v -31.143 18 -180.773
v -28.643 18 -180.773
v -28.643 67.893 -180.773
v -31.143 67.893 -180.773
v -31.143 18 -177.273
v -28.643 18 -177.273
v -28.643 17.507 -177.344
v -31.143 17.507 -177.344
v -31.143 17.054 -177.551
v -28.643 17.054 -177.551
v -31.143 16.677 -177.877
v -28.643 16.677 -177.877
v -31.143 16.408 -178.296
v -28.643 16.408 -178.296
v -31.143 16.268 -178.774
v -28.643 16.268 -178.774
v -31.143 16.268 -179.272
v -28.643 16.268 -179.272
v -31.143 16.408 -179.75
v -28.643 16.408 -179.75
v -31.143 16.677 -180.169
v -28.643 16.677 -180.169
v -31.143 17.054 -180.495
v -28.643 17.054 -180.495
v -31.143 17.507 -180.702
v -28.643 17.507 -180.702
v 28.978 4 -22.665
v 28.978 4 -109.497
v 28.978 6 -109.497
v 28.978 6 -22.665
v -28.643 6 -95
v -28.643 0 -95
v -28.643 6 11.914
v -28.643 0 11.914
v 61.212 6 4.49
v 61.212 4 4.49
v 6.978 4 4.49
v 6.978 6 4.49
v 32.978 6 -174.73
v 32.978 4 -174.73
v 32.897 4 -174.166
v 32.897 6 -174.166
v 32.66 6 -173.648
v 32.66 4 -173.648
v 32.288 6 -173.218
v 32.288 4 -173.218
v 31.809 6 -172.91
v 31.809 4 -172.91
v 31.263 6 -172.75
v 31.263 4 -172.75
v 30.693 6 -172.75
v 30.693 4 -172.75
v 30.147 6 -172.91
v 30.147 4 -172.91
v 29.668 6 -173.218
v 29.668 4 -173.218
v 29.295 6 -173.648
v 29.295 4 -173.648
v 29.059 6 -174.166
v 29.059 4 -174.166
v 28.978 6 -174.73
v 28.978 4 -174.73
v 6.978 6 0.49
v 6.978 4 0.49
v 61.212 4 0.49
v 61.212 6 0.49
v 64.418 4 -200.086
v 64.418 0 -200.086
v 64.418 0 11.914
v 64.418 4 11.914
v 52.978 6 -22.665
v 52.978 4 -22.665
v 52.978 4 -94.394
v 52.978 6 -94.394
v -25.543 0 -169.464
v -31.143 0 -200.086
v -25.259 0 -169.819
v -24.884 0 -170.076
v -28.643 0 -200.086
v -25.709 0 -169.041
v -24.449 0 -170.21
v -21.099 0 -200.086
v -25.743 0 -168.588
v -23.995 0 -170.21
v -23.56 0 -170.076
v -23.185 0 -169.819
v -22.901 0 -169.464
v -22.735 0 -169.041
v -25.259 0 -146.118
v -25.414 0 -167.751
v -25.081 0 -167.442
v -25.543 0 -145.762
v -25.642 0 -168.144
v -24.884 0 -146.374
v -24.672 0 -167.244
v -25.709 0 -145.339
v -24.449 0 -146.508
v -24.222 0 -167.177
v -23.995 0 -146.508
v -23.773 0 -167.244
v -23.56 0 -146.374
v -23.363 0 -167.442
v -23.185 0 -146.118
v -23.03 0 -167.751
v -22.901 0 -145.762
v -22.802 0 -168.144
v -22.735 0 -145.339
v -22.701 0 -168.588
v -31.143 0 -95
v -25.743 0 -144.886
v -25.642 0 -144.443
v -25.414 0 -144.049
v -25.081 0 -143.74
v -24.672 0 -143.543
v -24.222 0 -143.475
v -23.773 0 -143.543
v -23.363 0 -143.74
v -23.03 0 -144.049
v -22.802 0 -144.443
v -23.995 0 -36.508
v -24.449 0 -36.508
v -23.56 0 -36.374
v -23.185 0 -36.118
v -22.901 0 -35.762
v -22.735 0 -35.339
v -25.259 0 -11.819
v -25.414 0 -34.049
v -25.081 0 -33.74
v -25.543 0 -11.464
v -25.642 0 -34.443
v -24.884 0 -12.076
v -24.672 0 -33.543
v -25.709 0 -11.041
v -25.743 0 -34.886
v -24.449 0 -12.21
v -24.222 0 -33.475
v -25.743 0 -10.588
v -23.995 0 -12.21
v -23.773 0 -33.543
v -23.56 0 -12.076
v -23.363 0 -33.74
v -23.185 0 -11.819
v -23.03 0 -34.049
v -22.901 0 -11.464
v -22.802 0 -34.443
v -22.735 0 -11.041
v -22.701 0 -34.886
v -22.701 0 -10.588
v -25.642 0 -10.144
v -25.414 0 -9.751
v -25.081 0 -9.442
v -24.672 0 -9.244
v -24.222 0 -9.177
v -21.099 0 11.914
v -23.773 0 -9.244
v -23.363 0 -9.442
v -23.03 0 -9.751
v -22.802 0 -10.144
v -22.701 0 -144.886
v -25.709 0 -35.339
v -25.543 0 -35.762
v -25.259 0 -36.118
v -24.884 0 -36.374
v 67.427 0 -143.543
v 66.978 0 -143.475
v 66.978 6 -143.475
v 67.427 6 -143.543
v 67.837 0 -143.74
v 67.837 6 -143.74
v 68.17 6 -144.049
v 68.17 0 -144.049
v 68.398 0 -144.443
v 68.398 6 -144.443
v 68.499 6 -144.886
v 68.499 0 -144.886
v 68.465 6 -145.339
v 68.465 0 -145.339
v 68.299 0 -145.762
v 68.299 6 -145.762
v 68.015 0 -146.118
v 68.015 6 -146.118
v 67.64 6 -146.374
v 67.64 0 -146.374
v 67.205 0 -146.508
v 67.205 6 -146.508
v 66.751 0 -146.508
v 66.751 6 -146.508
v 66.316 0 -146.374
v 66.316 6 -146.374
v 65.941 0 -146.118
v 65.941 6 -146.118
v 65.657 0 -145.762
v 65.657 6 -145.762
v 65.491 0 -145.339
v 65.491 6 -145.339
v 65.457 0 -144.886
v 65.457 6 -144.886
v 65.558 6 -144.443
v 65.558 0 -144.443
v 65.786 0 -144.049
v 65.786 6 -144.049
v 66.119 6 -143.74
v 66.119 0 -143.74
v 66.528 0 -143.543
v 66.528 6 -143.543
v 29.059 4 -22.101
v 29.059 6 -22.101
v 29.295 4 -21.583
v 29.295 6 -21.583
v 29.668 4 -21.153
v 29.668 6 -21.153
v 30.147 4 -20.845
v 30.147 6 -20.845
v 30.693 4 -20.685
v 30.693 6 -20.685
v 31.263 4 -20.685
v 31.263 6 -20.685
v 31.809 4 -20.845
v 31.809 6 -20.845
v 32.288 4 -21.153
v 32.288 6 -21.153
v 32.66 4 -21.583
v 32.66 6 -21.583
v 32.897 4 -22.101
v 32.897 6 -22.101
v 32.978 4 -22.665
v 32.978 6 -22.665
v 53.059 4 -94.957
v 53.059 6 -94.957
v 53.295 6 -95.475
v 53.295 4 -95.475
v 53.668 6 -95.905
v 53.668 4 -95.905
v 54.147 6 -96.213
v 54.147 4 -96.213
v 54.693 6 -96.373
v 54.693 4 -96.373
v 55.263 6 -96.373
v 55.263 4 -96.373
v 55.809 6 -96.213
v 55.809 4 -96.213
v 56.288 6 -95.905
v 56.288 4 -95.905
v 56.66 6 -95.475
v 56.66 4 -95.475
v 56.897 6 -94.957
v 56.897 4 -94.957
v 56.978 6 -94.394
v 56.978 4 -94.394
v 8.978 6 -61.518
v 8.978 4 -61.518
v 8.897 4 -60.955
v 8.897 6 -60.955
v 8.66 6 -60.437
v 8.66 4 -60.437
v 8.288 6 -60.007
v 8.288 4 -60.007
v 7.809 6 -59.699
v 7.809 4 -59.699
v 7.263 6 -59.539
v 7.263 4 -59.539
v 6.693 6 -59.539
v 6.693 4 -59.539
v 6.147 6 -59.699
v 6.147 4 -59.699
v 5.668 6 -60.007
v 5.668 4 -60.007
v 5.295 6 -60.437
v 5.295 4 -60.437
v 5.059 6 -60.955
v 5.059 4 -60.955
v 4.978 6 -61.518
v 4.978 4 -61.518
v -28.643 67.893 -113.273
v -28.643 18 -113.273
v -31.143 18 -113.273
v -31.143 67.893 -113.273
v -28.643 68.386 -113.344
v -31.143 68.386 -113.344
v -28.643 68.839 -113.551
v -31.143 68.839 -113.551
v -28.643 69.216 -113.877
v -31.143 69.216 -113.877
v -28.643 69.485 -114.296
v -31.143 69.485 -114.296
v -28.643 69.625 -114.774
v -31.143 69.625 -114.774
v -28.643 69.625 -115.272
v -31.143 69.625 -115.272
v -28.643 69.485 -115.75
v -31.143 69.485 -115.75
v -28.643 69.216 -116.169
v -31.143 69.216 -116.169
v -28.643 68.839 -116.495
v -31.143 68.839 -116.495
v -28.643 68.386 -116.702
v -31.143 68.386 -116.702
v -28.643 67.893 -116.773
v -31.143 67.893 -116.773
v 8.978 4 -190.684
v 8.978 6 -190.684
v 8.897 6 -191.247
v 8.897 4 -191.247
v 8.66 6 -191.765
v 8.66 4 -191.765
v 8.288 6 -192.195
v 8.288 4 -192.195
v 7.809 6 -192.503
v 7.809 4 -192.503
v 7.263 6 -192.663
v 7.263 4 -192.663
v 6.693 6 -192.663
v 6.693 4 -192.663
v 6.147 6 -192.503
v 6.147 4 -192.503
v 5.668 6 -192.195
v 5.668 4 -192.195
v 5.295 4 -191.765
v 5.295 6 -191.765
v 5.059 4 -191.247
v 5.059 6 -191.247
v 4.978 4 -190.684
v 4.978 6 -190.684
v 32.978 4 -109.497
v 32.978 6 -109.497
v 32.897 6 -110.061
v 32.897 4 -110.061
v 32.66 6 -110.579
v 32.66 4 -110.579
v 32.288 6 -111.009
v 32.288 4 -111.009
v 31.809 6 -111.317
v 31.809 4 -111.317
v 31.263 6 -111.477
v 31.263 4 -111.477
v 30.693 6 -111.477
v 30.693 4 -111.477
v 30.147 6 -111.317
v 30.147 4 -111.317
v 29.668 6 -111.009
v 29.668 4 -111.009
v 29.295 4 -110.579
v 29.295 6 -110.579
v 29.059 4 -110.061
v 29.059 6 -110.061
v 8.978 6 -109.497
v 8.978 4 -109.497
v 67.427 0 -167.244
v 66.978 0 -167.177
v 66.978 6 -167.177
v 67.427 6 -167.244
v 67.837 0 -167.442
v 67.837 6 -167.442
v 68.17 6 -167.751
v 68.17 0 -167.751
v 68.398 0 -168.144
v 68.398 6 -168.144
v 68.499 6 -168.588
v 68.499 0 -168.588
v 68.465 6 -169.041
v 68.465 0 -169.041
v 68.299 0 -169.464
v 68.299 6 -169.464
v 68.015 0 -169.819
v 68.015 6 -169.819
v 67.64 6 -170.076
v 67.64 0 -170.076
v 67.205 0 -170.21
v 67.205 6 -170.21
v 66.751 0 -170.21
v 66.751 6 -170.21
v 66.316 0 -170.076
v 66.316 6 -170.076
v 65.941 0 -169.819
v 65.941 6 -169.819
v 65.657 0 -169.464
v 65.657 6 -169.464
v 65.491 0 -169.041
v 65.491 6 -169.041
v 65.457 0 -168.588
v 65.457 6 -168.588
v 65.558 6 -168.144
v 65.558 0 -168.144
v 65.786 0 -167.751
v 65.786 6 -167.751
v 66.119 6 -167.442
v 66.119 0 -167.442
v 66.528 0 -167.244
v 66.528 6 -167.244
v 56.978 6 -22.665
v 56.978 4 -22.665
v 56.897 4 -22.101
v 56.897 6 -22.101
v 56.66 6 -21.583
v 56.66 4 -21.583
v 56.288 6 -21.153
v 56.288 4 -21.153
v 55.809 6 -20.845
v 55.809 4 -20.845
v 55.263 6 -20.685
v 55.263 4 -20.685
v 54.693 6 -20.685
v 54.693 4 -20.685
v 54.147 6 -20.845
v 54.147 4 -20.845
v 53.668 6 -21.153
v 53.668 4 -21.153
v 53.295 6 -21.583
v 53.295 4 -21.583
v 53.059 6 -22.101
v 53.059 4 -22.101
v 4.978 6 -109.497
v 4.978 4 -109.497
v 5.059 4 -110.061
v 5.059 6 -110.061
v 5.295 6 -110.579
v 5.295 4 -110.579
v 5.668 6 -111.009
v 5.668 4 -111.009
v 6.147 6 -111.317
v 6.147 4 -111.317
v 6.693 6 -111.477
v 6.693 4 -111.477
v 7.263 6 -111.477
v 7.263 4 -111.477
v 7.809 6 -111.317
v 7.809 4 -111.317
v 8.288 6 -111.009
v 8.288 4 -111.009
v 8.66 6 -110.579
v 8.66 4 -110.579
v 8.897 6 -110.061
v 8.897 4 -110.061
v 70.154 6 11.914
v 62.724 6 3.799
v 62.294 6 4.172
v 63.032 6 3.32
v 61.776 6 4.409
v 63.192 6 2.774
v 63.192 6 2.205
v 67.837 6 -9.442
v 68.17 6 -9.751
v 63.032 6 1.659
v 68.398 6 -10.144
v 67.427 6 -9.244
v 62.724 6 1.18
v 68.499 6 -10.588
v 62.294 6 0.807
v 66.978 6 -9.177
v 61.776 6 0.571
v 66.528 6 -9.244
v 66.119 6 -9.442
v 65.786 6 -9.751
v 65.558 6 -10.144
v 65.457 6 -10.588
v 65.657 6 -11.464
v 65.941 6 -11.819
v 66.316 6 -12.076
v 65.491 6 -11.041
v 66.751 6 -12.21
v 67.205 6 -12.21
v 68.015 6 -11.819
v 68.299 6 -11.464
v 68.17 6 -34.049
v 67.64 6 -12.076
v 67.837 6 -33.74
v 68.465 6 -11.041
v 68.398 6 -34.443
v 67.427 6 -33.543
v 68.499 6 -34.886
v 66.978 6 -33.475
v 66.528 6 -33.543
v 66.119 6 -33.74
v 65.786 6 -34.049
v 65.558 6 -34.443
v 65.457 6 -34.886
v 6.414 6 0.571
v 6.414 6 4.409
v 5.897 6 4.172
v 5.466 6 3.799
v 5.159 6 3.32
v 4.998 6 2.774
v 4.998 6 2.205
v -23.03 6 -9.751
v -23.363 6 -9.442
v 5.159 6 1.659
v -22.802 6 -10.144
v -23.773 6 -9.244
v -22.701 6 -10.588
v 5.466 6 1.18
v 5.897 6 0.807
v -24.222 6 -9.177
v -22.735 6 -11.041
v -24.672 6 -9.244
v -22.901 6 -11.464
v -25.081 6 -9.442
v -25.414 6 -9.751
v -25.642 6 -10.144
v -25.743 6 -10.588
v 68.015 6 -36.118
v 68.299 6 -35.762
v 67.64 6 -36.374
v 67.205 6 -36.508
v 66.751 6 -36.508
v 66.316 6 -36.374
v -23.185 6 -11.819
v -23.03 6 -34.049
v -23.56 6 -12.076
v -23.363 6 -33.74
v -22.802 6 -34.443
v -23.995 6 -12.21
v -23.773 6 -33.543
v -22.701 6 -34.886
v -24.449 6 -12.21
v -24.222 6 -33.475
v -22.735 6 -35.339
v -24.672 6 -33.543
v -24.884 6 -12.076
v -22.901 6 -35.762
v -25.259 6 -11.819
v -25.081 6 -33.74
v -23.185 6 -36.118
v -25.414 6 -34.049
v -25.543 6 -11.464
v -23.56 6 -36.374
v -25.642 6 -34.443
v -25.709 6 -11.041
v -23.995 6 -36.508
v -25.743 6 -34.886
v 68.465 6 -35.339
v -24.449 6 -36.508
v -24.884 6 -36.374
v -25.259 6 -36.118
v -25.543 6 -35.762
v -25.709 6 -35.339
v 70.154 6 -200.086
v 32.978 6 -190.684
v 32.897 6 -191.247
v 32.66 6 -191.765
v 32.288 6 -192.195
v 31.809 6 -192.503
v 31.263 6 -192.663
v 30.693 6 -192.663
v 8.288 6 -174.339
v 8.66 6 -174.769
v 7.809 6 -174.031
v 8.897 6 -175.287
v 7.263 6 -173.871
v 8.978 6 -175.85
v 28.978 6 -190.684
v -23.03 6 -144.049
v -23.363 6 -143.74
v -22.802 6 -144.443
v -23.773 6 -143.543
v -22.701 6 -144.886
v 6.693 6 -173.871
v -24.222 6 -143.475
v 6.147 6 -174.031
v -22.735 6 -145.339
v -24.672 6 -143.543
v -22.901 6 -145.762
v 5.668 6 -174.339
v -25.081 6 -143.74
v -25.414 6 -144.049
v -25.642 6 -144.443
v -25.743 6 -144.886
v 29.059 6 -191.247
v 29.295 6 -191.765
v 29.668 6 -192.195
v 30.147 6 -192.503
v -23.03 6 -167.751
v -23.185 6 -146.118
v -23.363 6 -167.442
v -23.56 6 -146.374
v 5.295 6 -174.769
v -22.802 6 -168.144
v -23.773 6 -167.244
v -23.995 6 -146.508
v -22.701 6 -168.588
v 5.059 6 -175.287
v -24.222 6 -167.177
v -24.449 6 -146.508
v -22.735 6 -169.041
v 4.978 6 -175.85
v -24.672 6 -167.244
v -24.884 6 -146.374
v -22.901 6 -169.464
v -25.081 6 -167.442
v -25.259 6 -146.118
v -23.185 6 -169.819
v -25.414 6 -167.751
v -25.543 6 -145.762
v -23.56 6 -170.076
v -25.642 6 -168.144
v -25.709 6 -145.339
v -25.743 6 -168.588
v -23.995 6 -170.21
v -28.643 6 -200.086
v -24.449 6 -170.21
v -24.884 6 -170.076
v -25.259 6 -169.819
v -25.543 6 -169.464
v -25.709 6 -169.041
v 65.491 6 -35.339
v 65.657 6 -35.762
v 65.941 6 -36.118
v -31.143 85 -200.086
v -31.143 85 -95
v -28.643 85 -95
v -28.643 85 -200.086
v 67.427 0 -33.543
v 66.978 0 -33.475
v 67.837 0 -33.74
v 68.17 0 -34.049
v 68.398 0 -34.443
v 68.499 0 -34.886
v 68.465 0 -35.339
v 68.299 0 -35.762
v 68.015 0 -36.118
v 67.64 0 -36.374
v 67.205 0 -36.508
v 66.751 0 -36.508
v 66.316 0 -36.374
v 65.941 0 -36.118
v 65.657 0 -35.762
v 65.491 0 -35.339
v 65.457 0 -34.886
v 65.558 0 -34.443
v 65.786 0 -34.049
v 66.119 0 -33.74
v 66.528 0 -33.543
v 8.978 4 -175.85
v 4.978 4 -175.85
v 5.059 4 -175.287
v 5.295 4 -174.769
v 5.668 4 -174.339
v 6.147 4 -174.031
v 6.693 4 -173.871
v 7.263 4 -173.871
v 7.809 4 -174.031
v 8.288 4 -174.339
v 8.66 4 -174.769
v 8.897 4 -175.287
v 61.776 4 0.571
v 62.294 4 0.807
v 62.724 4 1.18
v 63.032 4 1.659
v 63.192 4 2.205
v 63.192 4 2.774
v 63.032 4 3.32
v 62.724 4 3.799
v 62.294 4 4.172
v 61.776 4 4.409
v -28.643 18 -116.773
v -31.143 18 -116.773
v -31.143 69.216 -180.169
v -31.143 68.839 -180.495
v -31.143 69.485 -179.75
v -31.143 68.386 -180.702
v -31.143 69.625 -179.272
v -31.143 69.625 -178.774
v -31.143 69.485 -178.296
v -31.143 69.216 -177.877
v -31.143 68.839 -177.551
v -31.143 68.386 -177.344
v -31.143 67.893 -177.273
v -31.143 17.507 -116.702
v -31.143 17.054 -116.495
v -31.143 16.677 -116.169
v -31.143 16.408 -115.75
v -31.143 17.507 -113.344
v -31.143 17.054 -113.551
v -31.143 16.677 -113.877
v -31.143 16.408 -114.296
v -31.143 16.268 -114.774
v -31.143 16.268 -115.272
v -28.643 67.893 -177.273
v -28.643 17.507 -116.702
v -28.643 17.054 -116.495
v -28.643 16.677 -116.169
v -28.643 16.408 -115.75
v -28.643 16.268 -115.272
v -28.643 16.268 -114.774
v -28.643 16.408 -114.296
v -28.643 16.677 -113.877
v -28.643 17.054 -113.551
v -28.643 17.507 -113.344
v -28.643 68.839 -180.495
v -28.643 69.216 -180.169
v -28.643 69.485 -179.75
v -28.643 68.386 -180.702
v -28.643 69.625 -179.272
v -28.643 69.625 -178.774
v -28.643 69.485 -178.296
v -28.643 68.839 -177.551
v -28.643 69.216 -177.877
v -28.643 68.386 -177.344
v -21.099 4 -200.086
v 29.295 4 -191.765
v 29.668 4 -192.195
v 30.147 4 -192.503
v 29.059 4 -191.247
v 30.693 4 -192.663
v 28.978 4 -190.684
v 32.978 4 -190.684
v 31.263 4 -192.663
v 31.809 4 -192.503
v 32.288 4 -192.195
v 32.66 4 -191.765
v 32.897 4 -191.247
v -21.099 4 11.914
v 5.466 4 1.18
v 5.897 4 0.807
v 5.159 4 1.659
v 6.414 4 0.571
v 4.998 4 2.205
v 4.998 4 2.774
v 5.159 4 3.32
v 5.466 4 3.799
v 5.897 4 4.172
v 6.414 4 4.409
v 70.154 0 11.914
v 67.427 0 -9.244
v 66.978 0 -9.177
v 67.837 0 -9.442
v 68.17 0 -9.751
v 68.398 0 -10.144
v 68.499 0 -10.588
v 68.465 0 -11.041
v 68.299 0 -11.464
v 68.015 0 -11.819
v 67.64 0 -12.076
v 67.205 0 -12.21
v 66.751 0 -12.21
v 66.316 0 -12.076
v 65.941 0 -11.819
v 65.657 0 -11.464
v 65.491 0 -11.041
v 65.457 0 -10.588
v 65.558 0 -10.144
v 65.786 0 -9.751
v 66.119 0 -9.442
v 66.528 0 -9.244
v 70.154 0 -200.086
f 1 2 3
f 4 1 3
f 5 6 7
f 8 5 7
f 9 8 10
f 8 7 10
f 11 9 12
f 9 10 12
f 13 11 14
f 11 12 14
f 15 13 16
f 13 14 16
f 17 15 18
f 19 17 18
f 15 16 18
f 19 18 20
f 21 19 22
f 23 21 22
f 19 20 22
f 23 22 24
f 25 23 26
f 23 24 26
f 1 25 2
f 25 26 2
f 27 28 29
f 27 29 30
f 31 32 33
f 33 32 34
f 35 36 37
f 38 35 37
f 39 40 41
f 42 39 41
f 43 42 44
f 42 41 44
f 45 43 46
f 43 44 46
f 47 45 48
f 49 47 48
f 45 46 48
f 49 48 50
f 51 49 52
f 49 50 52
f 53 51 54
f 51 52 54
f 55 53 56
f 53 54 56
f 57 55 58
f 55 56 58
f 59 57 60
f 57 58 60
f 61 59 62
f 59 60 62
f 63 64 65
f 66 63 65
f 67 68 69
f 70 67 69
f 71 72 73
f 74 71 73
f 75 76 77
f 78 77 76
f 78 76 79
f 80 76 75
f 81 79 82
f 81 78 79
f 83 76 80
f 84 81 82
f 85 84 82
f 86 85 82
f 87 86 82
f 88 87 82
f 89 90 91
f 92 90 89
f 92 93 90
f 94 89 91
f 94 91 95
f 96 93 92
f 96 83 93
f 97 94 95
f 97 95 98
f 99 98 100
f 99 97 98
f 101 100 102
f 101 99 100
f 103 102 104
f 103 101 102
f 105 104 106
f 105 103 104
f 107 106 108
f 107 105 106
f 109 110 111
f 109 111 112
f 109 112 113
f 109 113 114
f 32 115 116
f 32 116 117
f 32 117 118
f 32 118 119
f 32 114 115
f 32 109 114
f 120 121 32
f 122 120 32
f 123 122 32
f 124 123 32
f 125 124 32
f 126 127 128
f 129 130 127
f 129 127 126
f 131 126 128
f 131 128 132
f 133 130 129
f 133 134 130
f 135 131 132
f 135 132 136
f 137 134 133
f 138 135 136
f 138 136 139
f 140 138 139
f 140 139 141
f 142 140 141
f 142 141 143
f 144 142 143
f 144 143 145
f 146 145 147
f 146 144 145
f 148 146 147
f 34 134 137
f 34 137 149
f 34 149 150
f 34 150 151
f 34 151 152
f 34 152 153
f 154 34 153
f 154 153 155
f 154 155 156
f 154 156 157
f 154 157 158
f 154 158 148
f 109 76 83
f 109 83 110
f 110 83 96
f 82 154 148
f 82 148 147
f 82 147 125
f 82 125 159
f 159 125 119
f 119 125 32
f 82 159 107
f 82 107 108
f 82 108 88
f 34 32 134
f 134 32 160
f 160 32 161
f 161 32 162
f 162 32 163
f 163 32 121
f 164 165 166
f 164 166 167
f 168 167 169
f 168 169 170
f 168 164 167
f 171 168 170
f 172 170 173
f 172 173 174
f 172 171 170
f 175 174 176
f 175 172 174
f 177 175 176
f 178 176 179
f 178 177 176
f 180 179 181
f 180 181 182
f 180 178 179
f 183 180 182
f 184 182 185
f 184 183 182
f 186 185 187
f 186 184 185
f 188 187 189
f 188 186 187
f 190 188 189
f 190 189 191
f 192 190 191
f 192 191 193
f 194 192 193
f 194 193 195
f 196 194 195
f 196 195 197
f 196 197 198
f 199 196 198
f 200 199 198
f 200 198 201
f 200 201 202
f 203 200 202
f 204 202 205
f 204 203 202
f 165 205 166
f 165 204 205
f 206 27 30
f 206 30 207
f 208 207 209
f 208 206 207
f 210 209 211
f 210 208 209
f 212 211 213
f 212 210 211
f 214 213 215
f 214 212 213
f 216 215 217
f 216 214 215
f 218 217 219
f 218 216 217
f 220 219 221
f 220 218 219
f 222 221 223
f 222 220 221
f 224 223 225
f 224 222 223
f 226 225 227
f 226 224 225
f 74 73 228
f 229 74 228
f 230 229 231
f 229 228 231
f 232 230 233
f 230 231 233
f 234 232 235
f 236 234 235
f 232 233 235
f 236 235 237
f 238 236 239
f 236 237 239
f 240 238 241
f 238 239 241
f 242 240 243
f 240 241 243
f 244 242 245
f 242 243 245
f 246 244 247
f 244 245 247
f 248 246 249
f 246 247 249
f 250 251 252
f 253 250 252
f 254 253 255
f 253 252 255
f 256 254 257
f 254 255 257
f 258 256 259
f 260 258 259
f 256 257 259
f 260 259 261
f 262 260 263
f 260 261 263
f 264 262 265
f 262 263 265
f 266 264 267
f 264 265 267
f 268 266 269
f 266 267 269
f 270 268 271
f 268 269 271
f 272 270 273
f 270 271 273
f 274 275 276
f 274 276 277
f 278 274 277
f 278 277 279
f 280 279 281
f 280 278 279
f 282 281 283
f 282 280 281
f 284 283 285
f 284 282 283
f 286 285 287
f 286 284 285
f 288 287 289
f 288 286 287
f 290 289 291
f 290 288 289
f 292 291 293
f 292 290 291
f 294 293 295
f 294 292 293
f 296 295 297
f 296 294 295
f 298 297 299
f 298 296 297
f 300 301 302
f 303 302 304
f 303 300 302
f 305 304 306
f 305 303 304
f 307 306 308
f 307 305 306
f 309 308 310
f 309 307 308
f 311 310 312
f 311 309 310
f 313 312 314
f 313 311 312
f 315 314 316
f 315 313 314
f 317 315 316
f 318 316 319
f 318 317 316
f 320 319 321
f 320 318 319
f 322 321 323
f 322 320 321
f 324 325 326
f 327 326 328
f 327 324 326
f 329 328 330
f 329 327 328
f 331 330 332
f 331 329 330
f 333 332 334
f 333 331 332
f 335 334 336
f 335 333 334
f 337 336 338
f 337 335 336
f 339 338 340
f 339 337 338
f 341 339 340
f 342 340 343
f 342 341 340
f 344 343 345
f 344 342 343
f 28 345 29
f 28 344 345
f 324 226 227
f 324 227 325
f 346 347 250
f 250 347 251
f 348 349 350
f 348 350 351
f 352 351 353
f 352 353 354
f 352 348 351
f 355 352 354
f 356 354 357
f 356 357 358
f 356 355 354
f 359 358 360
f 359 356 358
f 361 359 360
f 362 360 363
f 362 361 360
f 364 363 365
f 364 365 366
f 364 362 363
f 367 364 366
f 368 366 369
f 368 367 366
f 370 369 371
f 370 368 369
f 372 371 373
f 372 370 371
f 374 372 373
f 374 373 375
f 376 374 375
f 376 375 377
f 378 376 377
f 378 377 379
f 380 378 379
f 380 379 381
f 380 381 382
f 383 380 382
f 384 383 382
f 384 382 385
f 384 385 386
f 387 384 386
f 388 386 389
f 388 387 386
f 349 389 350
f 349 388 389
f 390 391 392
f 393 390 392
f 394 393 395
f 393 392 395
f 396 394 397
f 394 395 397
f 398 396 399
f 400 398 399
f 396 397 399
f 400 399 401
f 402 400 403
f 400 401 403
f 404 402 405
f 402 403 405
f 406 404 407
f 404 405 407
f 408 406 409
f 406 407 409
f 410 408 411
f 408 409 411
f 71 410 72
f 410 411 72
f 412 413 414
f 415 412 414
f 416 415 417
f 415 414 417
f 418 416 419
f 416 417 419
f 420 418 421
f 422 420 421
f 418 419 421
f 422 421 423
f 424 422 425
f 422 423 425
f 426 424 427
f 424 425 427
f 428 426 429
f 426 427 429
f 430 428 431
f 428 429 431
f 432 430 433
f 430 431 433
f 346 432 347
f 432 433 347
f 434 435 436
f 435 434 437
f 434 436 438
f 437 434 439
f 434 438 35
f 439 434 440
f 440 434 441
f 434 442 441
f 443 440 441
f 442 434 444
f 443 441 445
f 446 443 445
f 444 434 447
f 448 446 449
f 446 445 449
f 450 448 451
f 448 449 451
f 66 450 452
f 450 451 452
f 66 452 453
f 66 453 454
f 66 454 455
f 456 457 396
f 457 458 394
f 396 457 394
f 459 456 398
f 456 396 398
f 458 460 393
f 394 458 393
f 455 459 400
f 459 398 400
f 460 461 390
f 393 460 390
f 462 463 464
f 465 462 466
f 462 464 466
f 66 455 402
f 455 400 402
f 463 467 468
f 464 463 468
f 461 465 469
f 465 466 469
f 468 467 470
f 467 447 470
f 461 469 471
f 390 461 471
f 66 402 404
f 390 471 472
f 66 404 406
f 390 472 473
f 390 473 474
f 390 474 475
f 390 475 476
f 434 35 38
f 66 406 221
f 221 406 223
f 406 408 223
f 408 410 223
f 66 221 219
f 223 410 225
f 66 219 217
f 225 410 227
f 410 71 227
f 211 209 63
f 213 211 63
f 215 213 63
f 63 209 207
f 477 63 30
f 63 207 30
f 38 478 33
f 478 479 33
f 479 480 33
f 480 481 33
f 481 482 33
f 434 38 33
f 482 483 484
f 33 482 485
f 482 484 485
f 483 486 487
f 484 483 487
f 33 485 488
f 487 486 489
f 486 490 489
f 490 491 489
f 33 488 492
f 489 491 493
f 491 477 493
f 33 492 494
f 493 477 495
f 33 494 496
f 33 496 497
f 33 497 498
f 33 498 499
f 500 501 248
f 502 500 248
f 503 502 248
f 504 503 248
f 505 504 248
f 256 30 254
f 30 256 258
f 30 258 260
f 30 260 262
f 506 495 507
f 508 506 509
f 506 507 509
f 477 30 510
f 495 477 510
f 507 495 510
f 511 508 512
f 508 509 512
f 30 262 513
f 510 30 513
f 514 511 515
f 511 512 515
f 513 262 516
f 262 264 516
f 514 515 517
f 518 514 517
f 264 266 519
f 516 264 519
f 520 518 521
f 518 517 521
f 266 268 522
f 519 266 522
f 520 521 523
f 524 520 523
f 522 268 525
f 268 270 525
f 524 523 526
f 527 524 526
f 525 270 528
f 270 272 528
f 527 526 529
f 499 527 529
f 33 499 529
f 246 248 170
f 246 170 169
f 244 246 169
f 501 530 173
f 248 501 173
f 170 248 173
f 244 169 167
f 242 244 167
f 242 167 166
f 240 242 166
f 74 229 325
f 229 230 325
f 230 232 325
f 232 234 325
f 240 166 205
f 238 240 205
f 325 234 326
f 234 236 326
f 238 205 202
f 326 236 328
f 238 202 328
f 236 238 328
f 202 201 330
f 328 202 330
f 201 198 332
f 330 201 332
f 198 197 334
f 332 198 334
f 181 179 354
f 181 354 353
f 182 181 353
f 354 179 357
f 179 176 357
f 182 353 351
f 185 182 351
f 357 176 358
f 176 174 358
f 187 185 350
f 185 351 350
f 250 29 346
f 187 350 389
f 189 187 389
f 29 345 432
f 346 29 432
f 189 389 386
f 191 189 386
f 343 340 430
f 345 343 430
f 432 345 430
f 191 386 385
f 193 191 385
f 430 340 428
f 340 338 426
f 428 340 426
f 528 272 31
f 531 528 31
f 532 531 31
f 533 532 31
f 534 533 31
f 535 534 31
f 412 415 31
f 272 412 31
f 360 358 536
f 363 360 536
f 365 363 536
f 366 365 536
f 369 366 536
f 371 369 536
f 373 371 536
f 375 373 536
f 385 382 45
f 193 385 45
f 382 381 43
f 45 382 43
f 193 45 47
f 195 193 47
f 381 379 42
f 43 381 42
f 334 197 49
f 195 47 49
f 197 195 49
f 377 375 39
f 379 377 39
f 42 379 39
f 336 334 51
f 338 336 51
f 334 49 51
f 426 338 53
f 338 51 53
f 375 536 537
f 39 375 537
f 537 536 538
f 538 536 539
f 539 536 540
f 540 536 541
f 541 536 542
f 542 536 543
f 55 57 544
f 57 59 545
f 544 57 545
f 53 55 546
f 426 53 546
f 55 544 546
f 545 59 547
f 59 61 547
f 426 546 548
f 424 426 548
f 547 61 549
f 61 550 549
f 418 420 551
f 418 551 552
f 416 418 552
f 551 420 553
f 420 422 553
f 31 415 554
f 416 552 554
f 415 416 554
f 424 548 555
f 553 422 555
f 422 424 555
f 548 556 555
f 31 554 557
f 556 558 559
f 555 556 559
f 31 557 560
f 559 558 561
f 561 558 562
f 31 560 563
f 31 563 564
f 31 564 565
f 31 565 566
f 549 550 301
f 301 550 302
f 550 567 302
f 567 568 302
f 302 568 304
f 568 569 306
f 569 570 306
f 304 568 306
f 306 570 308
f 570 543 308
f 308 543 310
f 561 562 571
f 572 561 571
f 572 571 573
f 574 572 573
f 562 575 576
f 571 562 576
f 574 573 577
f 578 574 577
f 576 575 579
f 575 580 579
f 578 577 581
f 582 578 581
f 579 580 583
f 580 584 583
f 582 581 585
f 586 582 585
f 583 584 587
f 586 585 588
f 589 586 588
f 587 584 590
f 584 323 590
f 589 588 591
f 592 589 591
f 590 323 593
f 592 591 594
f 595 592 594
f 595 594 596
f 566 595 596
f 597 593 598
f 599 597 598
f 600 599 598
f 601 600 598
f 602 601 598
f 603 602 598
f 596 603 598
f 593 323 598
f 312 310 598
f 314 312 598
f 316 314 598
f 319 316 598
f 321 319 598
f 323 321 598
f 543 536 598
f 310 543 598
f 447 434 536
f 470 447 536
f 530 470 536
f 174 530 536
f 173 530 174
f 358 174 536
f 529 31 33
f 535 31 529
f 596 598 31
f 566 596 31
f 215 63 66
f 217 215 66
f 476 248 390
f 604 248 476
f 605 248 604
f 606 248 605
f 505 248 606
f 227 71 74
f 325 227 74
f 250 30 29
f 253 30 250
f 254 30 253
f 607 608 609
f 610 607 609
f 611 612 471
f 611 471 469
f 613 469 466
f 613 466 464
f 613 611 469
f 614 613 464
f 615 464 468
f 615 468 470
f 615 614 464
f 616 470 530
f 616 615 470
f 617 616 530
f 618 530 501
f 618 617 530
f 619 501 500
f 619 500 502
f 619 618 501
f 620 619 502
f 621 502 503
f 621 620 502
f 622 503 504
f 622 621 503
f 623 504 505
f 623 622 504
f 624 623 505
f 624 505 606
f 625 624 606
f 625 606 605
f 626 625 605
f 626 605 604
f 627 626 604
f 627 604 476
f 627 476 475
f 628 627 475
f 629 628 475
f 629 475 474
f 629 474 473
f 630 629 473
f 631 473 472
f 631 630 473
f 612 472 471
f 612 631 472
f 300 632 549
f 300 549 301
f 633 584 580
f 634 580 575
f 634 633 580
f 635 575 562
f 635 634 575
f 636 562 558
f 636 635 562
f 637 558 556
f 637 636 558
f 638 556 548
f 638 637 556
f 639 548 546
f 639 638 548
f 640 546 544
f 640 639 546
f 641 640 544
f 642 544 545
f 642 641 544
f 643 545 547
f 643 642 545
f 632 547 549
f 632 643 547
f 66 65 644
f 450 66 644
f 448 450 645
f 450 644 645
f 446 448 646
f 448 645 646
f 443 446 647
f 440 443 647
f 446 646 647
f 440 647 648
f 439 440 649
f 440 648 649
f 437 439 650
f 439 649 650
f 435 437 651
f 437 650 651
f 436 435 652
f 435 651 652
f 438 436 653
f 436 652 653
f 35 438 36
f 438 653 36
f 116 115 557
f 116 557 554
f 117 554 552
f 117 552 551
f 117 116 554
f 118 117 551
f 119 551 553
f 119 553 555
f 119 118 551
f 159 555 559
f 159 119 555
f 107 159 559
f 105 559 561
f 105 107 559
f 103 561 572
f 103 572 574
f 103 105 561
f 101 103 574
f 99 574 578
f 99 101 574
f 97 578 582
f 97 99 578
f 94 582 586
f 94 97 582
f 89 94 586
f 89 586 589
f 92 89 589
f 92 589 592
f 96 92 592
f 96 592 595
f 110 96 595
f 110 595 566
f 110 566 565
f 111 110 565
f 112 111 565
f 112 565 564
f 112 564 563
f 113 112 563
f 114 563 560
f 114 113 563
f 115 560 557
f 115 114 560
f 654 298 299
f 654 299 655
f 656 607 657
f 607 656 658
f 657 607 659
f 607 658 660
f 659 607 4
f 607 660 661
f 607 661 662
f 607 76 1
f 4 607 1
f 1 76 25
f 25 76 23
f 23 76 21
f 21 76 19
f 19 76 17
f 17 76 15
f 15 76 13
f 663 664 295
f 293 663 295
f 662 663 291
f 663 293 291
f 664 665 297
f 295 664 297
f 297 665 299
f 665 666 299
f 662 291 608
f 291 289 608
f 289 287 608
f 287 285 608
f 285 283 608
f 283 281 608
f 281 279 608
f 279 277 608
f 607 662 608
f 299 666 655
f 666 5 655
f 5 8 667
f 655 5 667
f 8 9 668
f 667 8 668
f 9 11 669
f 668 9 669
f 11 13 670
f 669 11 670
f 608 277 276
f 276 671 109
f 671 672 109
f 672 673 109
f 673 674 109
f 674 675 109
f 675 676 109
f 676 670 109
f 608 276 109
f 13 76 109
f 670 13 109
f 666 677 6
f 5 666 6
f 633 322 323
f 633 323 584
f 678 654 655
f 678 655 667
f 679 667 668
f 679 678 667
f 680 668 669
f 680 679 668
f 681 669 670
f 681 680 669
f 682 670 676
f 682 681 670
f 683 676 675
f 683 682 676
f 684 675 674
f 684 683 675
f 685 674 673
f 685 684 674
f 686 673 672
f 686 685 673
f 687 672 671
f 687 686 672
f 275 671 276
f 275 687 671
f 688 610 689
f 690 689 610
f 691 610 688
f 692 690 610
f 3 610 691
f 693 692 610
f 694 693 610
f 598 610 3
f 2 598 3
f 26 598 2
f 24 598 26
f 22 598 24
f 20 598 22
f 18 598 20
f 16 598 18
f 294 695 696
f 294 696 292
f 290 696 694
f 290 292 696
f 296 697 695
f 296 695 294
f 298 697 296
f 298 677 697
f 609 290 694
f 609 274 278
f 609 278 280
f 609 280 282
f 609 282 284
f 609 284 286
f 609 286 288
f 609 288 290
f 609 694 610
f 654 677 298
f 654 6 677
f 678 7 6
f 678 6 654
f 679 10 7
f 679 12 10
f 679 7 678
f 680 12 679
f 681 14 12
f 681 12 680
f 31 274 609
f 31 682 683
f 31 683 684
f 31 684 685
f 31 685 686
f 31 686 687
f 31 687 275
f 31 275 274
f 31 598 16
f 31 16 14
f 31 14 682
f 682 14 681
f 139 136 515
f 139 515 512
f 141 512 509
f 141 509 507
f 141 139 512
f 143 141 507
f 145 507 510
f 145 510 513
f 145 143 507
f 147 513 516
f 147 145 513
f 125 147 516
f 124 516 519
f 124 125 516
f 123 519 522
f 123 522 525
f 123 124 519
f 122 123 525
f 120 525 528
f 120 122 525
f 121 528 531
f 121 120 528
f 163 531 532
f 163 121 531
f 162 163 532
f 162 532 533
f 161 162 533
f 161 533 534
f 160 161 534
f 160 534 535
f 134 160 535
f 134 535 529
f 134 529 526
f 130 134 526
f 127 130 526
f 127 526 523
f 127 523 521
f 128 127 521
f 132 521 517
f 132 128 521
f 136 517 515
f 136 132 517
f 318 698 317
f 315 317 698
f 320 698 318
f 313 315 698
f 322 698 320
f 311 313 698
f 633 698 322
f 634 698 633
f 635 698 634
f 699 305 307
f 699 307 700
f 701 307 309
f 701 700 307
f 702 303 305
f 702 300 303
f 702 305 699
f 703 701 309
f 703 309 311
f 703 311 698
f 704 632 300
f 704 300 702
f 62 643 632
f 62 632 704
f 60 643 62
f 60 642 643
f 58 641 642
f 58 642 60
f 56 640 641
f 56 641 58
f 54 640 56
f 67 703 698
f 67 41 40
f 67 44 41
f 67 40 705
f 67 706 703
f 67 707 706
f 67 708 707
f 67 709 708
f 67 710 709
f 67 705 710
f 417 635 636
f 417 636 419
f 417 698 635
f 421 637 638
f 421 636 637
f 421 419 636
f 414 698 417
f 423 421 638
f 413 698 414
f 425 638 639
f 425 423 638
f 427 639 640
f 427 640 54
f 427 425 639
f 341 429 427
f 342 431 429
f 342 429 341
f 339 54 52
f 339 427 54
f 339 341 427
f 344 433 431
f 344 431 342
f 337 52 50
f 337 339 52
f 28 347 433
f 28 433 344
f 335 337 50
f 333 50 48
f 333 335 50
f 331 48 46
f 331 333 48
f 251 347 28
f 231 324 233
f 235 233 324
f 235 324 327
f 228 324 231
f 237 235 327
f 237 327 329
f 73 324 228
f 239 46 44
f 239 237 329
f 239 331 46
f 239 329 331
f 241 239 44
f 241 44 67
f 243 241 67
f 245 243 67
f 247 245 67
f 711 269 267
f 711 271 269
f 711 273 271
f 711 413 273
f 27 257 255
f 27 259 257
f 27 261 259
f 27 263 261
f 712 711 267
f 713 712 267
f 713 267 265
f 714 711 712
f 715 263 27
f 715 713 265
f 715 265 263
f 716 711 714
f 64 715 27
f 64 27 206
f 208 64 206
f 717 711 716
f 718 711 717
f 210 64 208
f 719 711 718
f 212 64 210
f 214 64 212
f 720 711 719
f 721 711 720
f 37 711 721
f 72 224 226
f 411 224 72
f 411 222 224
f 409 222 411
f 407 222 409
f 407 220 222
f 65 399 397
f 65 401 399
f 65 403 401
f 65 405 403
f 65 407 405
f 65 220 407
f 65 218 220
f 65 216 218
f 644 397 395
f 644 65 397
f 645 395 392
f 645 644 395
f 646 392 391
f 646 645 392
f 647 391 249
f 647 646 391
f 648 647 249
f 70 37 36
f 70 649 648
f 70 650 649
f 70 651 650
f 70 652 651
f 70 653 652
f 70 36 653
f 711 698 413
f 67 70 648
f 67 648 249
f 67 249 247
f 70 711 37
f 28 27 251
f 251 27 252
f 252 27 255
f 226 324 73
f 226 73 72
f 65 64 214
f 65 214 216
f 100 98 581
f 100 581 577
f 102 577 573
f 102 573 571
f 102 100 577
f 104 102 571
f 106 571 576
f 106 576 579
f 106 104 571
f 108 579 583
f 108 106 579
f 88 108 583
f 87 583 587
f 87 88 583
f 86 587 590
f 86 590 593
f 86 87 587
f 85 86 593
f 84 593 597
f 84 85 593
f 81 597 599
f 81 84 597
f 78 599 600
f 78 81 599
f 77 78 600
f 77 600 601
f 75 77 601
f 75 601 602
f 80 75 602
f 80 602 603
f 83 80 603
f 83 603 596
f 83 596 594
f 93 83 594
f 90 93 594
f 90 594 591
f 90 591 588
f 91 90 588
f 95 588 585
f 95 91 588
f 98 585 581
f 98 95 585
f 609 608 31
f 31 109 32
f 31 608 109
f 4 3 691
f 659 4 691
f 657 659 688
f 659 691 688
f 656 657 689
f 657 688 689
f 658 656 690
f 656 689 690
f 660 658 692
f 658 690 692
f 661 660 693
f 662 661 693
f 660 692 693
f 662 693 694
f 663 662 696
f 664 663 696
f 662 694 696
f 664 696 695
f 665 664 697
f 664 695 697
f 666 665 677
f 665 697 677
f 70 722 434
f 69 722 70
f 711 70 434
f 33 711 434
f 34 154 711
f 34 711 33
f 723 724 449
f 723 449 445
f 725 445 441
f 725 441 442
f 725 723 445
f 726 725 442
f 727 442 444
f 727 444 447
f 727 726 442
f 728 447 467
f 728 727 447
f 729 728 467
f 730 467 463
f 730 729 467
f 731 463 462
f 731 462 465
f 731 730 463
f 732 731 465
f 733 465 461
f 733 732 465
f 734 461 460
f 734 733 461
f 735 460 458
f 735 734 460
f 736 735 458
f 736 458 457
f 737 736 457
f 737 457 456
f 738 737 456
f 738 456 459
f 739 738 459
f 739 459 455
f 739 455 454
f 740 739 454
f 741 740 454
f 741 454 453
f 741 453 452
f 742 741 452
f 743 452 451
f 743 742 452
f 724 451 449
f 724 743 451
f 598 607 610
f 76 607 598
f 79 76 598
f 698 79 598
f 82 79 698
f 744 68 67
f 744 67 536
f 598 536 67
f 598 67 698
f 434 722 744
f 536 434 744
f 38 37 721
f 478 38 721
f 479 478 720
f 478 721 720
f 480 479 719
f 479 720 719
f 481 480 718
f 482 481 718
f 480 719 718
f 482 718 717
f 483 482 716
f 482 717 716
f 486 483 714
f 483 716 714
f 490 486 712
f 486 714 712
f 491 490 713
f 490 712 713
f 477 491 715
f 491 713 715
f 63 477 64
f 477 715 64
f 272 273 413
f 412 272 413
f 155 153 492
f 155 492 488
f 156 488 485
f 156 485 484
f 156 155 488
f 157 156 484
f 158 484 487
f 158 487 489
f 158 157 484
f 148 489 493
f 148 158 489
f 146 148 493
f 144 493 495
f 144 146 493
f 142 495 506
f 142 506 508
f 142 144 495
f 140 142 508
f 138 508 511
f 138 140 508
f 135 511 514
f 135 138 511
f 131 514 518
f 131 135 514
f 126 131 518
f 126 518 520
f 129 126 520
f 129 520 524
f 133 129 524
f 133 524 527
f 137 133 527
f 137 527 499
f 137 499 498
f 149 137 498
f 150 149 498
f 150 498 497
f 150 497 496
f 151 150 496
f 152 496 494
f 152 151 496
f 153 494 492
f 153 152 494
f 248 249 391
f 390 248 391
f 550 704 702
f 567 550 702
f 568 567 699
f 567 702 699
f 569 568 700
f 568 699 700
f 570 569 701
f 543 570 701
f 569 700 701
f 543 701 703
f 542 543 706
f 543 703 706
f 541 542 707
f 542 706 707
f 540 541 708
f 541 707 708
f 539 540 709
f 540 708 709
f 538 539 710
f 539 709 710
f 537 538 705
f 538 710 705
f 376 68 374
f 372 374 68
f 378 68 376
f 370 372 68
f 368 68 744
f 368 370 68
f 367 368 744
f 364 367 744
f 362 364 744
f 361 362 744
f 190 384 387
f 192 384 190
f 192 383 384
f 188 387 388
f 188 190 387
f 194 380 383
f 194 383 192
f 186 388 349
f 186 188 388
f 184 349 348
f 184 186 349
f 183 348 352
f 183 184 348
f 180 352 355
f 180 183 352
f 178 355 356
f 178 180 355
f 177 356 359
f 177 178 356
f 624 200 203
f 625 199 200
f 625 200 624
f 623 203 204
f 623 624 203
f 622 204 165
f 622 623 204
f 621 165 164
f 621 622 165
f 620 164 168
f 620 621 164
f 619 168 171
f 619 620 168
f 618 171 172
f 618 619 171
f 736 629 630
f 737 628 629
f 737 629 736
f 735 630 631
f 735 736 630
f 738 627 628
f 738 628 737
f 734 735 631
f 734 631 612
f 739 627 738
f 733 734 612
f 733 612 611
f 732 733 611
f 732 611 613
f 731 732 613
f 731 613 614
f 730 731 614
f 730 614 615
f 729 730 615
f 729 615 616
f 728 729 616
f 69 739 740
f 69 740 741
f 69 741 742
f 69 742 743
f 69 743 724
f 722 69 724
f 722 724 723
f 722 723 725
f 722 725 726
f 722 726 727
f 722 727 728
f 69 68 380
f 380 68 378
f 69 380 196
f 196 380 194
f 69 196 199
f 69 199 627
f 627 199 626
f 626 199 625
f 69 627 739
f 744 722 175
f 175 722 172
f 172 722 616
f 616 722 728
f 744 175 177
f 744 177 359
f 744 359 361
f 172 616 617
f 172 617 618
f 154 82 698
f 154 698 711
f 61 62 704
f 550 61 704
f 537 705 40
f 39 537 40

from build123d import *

# Parameters (mm, degrees)
SKETCH_1_R          = 1.525
EXTRUDE_1_DEPTH     = 6
SKETCH_4_W          = 2.5
SKETCH_4_H          = 105.086243491
EXTRUDE_3_DEPTH     = 85
CUT_EXTRUDE_1_DEPTH = 58
SKETCH_5_W          = 85.517137539
SKETCH_5_H          = 212
CUT_EXTRUDE_2_DEPTH = 4


with BuildPart() as part:
    # 草图1 → 凸台-拉伸1 (new body)
    with BuildSketch(Plane(origin=(0, 0, 0), x_dir=(1, 0, 0), z_dir=(0, 1, 0))):
        Polygon((0, 200.086243491), (70.15383623, 200.086243491), (70.15383623, 107.080558208), (70.15383623, -11.913756509), (-28.642514872, -11.913756509), (-28.642514872, 0.086243491), (-28.642514872, 200.086243491), (-10.033645843, 200.086243491), align=None)
        with Locations(Location((-24.222040848, 145, 0), (0, 0, 270))):
            Circle(SKETCH_1_R, mode=Mode.SUBTRACT)
        with Locations(Location((66.977959152, 145, 0), (0, 0, 270))):
            Circle(SKETCH_1_R, mode=Mode.SUBTRACT)
        with Locations(Location((66.977959152, 35, 0), (0, 0, 270))):
            Circle(SKETCH_1_R, mode=Mode.SUBTRACT)
        with Locations(Location((-24.222040848, 35, 0), (0, 0, 270))):
            Circle(SKETCH_1_R, mode=Mode.SUBTRACT)
        with Locations(Location((-24.222040848, 10.701543846, 0), (0, 0, 270))):
            Circle(SKETCH_1_R, mode=Mode.SUBTRACT)
        with Locations(Location((66.977959152, 10.701543846, 0), (0, 0, 270))):
            Circle(SKETCH_1_R, mode=Mode.SUBTRACT)
        with Locations(Location((66.977959152, 168.701543846, 0), (0, 0, 270))):
            Circle(SKETCH_1_R, mode=Mode.SUBTRACT)
        with Locations(Location((-24.222040848, 168.701543846, 0), (0, 0, 270))):
            Circle(SKETCH_1_R, mode=Mode.SUBTRACT)
        with BuildLine():
            Line((61.212367219, -4.489544392), (6.977959152, -4.489544392))
            ThreePointArc((6.977959152, -4.489544392), (4.977959152, -2.489544392), (6.977959152, -0.489544392))
            Line((6.977959152, -0.489544392), (8.977959152, -0.489544392))
            Line((8.977959152, -0.489544392), (28.977959152, -0.489544392))
            Line((28.977959152, -0.489544392), (32.977959152, -0.489544392))
            Line((32.977959152, -0.489544392), (52.977959152, -0.489544392))
            Line((52.977959152, -0.489544392), (56.977959152, -0.489544392))
            Line((56.977959152, -0.489544392), (61.212367219, -0.489544392))
            ThreePointArc((61.212367219, -0.489544392), (63.212367219, -2.489544392), (61.212367219, -4.489544392))
        make_face(mode=Mode.SUBTRACT)
        with BuildLine():
            Line((8.977959152, 109.497464931), (8.977959152, 61.518458116))
            ThreePointArc((8.977959152, 61.518458116), (6.977959152, 59.518458116), (4.977959152, 61.518458116))
            Line((4.977959152, 61.518458116), (4.977959152, 109.497464931))
            ThreePointArc((4.977959152, 109.497464931), (6.977959152, 111.497464931), (8.977959152, 109.497464931))
        make_face(mode=Mode.SUBTRACT)
        with BuildLine():
            Line((4.977959152, 190.683676085), (4.977959152, 175.850262547))
            ThreePointArc((4.977959152, 175.850262547), (6.977959152, 173.850262547), (8.977959152, 175.850262547))
            Line((8.977959152, 175.850262547), (8.977959152, 190.683676085))
            ThreePointArc((8.977959152, 190.683676085), (6.977959152, 192.683676085), (4.977959152, 190.683676085))
        make_face(mode=Mode.SUBTRACT)
        with BuildLine():
            Line((32.977959152, 190.683676085), (32.977959152, 174.729552713))
            ThreePointArc((32.977959152, 174.729552713), (30.977959152, 172.729552713), (28.977959152, 174.729552713))
            Line((28.977959152, 174.729552713), (28.977959152, 190.683676085))
            ThreePointArc((28.977959152, 190.683676085), (30.977959152, 192.683676085), (32.977959152, 190.683676085))
        make_face(mode=Mode.SUBTRACT)
        with BuildLine():
            Line((56.977959152, 94.393526779), (56.977959152, 22.664710655))
            ThreePointArc((56.977959152, 22.664710655), (54.977959152, 20.664710655), (52.977959152, 22.664710655))
            Line((52.977959152, 22.664710655), (52.977959152, 94.393526779))
            ThreePointArc((52.977959152, 94.393526779), (54.977959152, 96.393526779), (56.977959152, 94.393526779))
        make_face(mode=Mode.SUBTRACT)
        with BuildLine():
            Line((28.977959152, 109.497464931), (28.977959152, 22.664710655))
            ThreePointArc((28.977959152, 22.664710655), (30.977959152, 20.664710655), (32.977959152, 22.664710655))
            Line((32.977959152, 22.664710655), (32.977959152, 109.497464931))
            ThreePointArc((32.977959152, 109.497464931), (30.977959152, 111.497464931), (28.977959152, 109.497464931))
        make_face(mode=Mode.SUBTRACT)
    extrude(amount=EXTRUDE_1_DEPTH)

    # 草图4 → 凸台-拉伸3 (add)
    with BuildSketch(Plane.XZ):
        with Locations((-29.892514872, -147.543121746)):
            Rectangle(SKETCH_4_W, SKETCH_4_H)
    extrude(amount=-EXTRUDE_3_DEPTH)

    # 草图3 → 切除-拉伸1 (cut)
    with BuildSketch(Plane(origin=(-28.642514872, 0, 0), x_dir=(0, 0, -1), z_dir=(1, 0, 0))):
        with BuildLine():
            Line((113.273012401, 18), (113.273012401, 67.892967917))
            ThreePointArc((113.273012401, 67.892967917), (115.023012401, 69.642967917), (116.773012401, 67.892967917))
            Line((116.773012401, 67.892967917), (116.773012401, 18))
            ThreePointArc((116.773012401, 18), (115.023012401, 16.25), (113.273012401, 18))
        make_face()
        with BuildLine():
            Line((180.773012401, 18), (180.773012401, 67.892967917))
            ThreePointArc((180.773012401, 67.892967917), (179.023012401, 69.642967917), (177.273012401, 67.892967917))
            Line((177.273012401, 67.892967917), (177.273012401, 18))
            ThreePointArc((177.273012401, 18), (179.023012401, 16.25), (180.773012401, 18))
        make_face()
    extrude(amount=-CUT_EXTRUDE_1_DEPTH, mode=Mode.SUBTRACT)

    # 草图5 → 切除-拉伸2 (cut)
    with BuildSketch(Plane.XZ):
        with Locations((21.659274281, -94.086243491)):
            Rectangle(SKETCH_5_W, SKETCH_5_H)
    extrude(amount=-CUT_EXTRUDE_2_DEPTH, mode=Mode.SUBTRACT)


solid = part.part
